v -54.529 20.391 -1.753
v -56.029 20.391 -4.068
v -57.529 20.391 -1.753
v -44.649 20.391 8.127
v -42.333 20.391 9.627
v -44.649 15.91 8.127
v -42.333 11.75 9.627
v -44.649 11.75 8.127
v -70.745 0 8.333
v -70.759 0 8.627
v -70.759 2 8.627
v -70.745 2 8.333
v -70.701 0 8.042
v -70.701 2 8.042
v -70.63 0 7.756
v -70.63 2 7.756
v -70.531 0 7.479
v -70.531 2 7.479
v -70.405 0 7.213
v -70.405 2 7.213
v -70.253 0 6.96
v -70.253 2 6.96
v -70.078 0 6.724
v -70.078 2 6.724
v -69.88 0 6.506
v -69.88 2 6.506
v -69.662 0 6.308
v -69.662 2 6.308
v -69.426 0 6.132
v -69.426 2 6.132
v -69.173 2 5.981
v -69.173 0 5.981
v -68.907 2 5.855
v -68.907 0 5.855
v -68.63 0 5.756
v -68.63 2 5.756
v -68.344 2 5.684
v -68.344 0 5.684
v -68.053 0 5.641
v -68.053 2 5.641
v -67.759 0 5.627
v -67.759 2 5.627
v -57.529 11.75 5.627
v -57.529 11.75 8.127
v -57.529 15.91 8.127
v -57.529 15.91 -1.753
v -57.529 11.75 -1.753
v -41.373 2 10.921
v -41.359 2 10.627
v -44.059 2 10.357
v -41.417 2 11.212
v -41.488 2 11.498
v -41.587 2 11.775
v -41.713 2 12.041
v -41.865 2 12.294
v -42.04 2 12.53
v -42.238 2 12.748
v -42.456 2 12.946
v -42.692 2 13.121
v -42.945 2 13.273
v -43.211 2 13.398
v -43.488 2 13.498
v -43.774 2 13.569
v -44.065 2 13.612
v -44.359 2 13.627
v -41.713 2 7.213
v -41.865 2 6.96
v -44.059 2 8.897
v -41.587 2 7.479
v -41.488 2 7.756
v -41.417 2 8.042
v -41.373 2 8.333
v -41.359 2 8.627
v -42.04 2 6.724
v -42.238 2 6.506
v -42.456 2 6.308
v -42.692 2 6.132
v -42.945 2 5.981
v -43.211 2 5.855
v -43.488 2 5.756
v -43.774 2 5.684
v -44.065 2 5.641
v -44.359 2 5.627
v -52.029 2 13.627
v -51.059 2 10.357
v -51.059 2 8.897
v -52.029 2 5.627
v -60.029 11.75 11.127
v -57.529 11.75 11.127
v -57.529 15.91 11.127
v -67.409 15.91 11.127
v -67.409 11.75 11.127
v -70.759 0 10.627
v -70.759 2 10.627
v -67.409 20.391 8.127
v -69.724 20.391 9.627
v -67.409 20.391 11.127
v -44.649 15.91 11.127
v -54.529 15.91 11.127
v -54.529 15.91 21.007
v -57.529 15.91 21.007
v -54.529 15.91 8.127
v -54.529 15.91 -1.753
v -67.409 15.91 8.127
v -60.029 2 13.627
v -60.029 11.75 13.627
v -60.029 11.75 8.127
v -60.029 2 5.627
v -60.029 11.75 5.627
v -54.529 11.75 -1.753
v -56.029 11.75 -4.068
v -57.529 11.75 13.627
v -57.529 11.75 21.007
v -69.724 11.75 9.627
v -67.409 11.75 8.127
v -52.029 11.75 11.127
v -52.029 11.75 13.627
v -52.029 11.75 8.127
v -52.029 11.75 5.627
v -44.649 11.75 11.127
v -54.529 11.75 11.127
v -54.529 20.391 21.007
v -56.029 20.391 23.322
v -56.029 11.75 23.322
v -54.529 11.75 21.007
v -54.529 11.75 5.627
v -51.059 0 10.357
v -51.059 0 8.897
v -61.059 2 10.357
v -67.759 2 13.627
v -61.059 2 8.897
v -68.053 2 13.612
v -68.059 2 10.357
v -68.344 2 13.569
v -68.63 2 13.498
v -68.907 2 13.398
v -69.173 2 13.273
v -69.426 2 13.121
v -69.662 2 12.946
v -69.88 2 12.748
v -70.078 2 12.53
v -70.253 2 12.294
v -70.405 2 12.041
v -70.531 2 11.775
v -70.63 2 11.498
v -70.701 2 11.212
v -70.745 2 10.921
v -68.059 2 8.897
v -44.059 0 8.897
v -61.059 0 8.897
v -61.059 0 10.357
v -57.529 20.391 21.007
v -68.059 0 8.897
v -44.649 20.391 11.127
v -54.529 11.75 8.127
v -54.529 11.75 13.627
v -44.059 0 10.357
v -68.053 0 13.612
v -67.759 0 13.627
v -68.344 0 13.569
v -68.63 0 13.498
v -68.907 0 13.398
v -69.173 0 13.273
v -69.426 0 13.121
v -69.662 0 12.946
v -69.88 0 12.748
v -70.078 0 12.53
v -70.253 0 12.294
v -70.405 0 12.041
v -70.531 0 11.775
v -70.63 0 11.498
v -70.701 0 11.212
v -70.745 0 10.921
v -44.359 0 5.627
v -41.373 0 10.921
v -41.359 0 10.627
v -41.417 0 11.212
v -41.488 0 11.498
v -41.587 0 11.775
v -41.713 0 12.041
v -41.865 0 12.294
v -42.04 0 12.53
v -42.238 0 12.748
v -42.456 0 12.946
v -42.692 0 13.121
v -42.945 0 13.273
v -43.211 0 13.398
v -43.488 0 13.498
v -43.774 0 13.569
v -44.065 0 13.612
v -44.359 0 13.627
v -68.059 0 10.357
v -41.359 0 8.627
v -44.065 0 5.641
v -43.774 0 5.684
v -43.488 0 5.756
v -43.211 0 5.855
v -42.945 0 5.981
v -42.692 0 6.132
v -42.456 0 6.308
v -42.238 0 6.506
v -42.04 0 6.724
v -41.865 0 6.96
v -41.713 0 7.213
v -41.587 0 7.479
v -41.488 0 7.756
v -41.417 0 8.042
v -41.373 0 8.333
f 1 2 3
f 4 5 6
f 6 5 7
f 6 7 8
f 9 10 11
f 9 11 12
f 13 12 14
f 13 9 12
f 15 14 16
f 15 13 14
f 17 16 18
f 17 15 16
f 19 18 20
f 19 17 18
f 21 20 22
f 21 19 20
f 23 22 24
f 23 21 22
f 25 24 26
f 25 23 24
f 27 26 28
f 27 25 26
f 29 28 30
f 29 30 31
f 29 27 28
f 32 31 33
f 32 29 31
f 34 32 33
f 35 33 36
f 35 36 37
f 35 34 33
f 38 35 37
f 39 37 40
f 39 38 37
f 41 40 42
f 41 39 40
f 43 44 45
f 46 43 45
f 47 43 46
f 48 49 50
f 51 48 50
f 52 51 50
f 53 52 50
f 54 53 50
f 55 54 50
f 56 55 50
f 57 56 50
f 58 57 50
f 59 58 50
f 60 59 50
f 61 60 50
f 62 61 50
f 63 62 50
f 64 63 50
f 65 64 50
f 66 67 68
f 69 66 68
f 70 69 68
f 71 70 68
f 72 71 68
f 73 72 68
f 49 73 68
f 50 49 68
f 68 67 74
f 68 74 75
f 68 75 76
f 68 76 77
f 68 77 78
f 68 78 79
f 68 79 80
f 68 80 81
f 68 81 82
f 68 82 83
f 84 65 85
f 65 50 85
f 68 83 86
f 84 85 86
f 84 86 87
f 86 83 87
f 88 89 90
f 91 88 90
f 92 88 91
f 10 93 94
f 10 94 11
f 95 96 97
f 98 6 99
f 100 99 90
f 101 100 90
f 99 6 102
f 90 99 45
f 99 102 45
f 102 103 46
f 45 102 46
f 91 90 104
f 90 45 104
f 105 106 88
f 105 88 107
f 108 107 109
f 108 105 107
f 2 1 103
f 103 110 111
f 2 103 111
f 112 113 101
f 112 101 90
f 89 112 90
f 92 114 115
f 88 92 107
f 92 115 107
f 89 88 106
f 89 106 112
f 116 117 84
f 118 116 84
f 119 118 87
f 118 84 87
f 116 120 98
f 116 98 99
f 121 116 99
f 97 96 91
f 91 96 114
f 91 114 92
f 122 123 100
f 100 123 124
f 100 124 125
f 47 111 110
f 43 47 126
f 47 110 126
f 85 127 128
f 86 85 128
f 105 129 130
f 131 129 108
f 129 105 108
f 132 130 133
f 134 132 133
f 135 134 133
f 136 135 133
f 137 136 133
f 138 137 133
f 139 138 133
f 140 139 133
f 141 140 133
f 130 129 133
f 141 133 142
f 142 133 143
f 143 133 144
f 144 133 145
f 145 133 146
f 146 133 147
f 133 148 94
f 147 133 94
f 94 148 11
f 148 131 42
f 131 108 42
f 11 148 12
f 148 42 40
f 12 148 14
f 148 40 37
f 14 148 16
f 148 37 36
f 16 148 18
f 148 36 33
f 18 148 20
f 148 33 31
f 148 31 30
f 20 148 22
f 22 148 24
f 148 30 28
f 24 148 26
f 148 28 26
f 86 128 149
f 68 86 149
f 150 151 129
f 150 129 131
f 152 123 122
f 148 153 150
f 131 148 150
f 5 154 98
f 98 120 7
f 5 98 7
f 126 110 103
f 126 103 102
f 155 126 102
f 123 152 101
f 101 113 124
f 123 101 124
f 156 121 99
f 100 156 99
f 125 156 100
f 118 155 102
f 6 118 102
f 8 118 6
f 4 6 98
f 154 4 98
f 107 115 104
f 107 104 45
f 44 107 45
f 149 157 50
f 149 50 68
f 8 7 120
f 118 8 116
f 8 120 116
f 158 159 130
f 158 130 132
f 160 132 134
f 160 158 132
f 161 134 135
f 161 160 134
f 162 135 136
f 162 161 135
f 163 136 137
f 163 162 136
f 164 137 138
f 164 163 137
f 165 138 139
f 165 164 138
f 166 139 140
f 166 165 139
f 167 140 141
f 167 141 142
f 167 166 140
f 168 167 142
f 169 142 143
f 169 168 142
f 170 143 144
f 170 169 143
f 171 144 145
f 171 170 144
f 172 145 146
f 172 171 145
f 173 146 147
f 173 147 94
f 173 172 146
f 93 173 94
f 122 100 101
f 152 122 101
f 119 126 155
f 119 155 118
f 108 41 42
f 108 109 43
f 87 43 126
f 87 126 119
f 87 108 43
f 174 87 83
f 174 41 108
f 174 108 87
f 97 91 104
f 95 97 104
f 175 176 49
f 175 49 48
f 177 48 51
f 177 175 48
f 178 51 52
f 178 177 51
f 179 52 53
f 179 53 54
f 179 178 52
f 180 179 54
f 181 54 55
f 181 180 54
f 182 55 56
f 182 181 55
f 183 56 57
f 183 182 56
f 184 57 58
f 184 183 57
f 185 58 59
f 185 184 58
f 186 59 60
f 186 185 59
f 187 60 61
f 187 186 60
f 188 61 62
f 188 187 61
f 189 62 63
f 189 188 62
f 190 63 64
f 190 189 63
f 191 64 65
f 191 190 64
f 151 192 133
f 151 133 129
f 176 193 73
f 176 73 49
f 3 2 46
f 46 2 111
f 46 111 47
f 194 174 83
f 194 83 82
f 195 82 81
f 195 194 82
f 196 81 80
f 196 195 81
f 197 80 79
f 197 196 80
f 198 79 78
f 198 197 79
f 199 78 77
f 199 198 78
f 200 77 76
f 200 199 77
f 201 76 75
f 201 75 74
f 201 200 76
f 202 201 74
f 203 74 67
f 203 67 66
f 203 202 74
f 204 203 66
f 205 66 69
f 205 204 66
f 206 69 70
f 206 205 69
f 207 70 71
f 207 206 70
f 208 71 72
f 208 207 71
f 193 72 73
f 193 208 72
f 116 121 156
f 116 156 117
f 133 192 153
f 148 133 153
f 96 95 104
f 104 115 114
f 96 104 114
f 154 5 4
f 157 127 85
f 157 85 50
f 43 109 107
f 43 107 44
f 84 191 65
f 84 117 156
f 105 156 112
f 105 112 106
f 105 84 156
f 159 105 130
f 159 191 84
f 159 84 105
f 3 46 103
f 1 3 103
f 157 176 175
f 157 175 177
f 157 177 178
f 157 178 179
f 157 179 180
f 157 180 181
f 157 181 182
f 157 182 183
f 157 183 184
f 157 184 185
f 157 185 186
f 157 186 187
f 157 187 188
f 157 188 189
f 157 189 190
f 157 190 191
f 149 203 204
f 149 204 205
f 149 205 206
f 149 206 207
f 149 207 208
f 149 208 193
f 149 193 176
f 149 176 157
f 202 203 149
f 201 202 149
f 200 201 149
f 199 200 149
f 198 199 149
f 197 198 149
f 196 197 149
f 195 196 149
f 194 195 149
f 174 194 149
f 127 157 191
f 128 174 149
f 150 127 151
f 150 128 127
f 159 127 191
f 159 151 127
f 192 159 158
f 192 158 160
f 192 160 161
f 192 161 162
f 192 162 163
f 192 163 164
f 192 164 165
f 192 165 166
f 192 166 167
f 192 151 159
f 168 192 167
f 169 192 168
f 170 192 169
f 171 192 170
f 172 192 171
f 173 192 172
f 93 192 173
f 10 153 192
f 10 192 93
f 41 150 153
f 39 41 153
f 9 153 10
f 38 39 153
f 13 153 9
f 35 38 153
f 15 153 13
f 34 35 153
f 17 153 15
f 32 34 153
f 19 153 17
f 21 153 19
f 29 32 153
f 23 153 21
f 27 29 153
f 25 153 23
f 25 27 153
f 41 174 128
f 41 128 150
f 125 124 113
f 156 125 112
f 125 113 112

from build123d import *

# Parameters (mm, degrees)
SKETCH1_W           = 7
SKETCH1_H           = 1.46
BOSS_EXTRUDE2_DEPTH = 2
SKETCH2_W           = 8
SKETCH2_H           = 8
BOSS_EXTRUDE3_DEPTH = 9.74993
BOSS_EXTRUDE4_DEPTH = 4.16
BOSS_EXTRUDE5_DEPTH = 8.64081
SKETCH6_R           = 1.5
BOSS_EXTRUDE7_DEPTH = 0.5
CIRPATTERN2_COUNT   = 4


with BuildPart() as part:
    # Sketch1 → Boss-Extrude2 (new body)
    with BuildSketch(Plane(origin=(0, 0, 0), x_dir=(1, 0, 0), z_dir=(0, 1, 0))):
        with BuildLine():
            Line((-67.759015818, -5.626850133), (-44.359015818, -5.626850133))
            ThreePointArc((-44.359015818, -5.626850133), (-42.237695475, -6.50552979), (-41.359015818, -8.626850133))
            Line((-41.359015818, -8.626850133), (-41.359015818, -10.626850133))
            ThreePointArc((-41.359015818, -10.626850133), (-42.237695475, -12.748170477), (-44.359015818, -13.626850133))
            Line((-44.359015818, -13.626850133), (-67.759015818, -13.626850133))
            ThreePointArc((-67.759015818, -13.626850133), (-69.880336162, -12.748170477), (-70.759015818, -10.626850133))
            Line((-70.759015818, -10.626850133), (-70.759015818, -8.626850133))
            ThreePointArc((-70.759015818, -8.626850133), (-69.880336162, -6.50552979), (-67.759015818, -5.626850133))
        make_face()
        with Locations((-64.559015818, -9.626850133)):
            Rectangle(SKETCH1_W, SKETCH1_H, mode=Mode.SUBTRACT)
        with Locations((-47.559015818, -9.626850133)):
            Rectangle(SKETCH1_W, SKETCH1_H, mode=Mode.SUBTRACT)
    extrude(amount=BOSS_EXTRUDE2_DEPTH)

    # Sketch2 → Boss-Extrude3 (add)
    with BuildSketch(Plane(origin=(0, 2, 0), x_dir=(1, 0, 0), z_dir=(0, 1, 0))):
        with Locations((-56.028566074, -9.626850133)):
            Rectangle(SKETCH2_W, SKETCH2_H)
    extrude(amount=BOSS_EXTRUDE3_DEPTH)

    # Sketch3 → Boss-Extrude4 (add)
    with BuildSketch(Plane(origin=(0, 11.74993, 0), x_dir=(1, 0, 0), z_dir=(0, 1, 0))):
        Polygon((-67.408566074, -8.126850133), (-57.528566074, -8.126850133), (-57.528566074, 1.753149867), (-54.528566074, 1.753149867), (-54.528566074, -8.126850133), (-44.648566074, -8.126850133), (-44.648566074, -11.126850133), (-54.528566074, -11.126850133), (-54.528566074, -21.006850133), (-57.528566074, -21.006850133), (-57.528566074, -11.126850133), (-67.408566074, -11.126850133), align=None)
    extrude(amount=BOSS_EXTRUDE4_DEPTH)

    # Sketch4 → Boss-Extrude5 (add)
    with BuildSketch(Plane(origin=(0, 11.74993, 0), x_dir=(1, 0, 0), z_dir=(0, 1, 0))):
        Polygon((-67.408566074, -8.126850133), (-69.723836074, -9.626850133), (-67.408566074, -11.126850133), align=None)
    boss_extrude5 = extrude(amount=BOSS_EXTRUDE5_DEPTH)

    # Sketch6 → Boss-Extrude7 (add)
    with BuildSketch(Plane(origin=(0, 0, 0), x_dir=(1, 0, 0), z_dir=(0, 1, 0))):
        with Locations((-56.028566074, -9.626850133)):
            Circle(SKETCH6_R)
    extrude(amount=BOSS_EXTRUDE7_DEPTH)

    # CirPattern2: Boss-Extrude5 ×4 about axis
    cirpattern2_axis = Axis((-56.028566074, 0, 9.626850133), (0, 1, 0))
    for i in range(1, CIRPATTERN2_COUNT):
        add(boss_extrude5.rotate(cirpattern2_axis, i * 360 / CIRPATTERN2_COUNT))


solid = part.part
